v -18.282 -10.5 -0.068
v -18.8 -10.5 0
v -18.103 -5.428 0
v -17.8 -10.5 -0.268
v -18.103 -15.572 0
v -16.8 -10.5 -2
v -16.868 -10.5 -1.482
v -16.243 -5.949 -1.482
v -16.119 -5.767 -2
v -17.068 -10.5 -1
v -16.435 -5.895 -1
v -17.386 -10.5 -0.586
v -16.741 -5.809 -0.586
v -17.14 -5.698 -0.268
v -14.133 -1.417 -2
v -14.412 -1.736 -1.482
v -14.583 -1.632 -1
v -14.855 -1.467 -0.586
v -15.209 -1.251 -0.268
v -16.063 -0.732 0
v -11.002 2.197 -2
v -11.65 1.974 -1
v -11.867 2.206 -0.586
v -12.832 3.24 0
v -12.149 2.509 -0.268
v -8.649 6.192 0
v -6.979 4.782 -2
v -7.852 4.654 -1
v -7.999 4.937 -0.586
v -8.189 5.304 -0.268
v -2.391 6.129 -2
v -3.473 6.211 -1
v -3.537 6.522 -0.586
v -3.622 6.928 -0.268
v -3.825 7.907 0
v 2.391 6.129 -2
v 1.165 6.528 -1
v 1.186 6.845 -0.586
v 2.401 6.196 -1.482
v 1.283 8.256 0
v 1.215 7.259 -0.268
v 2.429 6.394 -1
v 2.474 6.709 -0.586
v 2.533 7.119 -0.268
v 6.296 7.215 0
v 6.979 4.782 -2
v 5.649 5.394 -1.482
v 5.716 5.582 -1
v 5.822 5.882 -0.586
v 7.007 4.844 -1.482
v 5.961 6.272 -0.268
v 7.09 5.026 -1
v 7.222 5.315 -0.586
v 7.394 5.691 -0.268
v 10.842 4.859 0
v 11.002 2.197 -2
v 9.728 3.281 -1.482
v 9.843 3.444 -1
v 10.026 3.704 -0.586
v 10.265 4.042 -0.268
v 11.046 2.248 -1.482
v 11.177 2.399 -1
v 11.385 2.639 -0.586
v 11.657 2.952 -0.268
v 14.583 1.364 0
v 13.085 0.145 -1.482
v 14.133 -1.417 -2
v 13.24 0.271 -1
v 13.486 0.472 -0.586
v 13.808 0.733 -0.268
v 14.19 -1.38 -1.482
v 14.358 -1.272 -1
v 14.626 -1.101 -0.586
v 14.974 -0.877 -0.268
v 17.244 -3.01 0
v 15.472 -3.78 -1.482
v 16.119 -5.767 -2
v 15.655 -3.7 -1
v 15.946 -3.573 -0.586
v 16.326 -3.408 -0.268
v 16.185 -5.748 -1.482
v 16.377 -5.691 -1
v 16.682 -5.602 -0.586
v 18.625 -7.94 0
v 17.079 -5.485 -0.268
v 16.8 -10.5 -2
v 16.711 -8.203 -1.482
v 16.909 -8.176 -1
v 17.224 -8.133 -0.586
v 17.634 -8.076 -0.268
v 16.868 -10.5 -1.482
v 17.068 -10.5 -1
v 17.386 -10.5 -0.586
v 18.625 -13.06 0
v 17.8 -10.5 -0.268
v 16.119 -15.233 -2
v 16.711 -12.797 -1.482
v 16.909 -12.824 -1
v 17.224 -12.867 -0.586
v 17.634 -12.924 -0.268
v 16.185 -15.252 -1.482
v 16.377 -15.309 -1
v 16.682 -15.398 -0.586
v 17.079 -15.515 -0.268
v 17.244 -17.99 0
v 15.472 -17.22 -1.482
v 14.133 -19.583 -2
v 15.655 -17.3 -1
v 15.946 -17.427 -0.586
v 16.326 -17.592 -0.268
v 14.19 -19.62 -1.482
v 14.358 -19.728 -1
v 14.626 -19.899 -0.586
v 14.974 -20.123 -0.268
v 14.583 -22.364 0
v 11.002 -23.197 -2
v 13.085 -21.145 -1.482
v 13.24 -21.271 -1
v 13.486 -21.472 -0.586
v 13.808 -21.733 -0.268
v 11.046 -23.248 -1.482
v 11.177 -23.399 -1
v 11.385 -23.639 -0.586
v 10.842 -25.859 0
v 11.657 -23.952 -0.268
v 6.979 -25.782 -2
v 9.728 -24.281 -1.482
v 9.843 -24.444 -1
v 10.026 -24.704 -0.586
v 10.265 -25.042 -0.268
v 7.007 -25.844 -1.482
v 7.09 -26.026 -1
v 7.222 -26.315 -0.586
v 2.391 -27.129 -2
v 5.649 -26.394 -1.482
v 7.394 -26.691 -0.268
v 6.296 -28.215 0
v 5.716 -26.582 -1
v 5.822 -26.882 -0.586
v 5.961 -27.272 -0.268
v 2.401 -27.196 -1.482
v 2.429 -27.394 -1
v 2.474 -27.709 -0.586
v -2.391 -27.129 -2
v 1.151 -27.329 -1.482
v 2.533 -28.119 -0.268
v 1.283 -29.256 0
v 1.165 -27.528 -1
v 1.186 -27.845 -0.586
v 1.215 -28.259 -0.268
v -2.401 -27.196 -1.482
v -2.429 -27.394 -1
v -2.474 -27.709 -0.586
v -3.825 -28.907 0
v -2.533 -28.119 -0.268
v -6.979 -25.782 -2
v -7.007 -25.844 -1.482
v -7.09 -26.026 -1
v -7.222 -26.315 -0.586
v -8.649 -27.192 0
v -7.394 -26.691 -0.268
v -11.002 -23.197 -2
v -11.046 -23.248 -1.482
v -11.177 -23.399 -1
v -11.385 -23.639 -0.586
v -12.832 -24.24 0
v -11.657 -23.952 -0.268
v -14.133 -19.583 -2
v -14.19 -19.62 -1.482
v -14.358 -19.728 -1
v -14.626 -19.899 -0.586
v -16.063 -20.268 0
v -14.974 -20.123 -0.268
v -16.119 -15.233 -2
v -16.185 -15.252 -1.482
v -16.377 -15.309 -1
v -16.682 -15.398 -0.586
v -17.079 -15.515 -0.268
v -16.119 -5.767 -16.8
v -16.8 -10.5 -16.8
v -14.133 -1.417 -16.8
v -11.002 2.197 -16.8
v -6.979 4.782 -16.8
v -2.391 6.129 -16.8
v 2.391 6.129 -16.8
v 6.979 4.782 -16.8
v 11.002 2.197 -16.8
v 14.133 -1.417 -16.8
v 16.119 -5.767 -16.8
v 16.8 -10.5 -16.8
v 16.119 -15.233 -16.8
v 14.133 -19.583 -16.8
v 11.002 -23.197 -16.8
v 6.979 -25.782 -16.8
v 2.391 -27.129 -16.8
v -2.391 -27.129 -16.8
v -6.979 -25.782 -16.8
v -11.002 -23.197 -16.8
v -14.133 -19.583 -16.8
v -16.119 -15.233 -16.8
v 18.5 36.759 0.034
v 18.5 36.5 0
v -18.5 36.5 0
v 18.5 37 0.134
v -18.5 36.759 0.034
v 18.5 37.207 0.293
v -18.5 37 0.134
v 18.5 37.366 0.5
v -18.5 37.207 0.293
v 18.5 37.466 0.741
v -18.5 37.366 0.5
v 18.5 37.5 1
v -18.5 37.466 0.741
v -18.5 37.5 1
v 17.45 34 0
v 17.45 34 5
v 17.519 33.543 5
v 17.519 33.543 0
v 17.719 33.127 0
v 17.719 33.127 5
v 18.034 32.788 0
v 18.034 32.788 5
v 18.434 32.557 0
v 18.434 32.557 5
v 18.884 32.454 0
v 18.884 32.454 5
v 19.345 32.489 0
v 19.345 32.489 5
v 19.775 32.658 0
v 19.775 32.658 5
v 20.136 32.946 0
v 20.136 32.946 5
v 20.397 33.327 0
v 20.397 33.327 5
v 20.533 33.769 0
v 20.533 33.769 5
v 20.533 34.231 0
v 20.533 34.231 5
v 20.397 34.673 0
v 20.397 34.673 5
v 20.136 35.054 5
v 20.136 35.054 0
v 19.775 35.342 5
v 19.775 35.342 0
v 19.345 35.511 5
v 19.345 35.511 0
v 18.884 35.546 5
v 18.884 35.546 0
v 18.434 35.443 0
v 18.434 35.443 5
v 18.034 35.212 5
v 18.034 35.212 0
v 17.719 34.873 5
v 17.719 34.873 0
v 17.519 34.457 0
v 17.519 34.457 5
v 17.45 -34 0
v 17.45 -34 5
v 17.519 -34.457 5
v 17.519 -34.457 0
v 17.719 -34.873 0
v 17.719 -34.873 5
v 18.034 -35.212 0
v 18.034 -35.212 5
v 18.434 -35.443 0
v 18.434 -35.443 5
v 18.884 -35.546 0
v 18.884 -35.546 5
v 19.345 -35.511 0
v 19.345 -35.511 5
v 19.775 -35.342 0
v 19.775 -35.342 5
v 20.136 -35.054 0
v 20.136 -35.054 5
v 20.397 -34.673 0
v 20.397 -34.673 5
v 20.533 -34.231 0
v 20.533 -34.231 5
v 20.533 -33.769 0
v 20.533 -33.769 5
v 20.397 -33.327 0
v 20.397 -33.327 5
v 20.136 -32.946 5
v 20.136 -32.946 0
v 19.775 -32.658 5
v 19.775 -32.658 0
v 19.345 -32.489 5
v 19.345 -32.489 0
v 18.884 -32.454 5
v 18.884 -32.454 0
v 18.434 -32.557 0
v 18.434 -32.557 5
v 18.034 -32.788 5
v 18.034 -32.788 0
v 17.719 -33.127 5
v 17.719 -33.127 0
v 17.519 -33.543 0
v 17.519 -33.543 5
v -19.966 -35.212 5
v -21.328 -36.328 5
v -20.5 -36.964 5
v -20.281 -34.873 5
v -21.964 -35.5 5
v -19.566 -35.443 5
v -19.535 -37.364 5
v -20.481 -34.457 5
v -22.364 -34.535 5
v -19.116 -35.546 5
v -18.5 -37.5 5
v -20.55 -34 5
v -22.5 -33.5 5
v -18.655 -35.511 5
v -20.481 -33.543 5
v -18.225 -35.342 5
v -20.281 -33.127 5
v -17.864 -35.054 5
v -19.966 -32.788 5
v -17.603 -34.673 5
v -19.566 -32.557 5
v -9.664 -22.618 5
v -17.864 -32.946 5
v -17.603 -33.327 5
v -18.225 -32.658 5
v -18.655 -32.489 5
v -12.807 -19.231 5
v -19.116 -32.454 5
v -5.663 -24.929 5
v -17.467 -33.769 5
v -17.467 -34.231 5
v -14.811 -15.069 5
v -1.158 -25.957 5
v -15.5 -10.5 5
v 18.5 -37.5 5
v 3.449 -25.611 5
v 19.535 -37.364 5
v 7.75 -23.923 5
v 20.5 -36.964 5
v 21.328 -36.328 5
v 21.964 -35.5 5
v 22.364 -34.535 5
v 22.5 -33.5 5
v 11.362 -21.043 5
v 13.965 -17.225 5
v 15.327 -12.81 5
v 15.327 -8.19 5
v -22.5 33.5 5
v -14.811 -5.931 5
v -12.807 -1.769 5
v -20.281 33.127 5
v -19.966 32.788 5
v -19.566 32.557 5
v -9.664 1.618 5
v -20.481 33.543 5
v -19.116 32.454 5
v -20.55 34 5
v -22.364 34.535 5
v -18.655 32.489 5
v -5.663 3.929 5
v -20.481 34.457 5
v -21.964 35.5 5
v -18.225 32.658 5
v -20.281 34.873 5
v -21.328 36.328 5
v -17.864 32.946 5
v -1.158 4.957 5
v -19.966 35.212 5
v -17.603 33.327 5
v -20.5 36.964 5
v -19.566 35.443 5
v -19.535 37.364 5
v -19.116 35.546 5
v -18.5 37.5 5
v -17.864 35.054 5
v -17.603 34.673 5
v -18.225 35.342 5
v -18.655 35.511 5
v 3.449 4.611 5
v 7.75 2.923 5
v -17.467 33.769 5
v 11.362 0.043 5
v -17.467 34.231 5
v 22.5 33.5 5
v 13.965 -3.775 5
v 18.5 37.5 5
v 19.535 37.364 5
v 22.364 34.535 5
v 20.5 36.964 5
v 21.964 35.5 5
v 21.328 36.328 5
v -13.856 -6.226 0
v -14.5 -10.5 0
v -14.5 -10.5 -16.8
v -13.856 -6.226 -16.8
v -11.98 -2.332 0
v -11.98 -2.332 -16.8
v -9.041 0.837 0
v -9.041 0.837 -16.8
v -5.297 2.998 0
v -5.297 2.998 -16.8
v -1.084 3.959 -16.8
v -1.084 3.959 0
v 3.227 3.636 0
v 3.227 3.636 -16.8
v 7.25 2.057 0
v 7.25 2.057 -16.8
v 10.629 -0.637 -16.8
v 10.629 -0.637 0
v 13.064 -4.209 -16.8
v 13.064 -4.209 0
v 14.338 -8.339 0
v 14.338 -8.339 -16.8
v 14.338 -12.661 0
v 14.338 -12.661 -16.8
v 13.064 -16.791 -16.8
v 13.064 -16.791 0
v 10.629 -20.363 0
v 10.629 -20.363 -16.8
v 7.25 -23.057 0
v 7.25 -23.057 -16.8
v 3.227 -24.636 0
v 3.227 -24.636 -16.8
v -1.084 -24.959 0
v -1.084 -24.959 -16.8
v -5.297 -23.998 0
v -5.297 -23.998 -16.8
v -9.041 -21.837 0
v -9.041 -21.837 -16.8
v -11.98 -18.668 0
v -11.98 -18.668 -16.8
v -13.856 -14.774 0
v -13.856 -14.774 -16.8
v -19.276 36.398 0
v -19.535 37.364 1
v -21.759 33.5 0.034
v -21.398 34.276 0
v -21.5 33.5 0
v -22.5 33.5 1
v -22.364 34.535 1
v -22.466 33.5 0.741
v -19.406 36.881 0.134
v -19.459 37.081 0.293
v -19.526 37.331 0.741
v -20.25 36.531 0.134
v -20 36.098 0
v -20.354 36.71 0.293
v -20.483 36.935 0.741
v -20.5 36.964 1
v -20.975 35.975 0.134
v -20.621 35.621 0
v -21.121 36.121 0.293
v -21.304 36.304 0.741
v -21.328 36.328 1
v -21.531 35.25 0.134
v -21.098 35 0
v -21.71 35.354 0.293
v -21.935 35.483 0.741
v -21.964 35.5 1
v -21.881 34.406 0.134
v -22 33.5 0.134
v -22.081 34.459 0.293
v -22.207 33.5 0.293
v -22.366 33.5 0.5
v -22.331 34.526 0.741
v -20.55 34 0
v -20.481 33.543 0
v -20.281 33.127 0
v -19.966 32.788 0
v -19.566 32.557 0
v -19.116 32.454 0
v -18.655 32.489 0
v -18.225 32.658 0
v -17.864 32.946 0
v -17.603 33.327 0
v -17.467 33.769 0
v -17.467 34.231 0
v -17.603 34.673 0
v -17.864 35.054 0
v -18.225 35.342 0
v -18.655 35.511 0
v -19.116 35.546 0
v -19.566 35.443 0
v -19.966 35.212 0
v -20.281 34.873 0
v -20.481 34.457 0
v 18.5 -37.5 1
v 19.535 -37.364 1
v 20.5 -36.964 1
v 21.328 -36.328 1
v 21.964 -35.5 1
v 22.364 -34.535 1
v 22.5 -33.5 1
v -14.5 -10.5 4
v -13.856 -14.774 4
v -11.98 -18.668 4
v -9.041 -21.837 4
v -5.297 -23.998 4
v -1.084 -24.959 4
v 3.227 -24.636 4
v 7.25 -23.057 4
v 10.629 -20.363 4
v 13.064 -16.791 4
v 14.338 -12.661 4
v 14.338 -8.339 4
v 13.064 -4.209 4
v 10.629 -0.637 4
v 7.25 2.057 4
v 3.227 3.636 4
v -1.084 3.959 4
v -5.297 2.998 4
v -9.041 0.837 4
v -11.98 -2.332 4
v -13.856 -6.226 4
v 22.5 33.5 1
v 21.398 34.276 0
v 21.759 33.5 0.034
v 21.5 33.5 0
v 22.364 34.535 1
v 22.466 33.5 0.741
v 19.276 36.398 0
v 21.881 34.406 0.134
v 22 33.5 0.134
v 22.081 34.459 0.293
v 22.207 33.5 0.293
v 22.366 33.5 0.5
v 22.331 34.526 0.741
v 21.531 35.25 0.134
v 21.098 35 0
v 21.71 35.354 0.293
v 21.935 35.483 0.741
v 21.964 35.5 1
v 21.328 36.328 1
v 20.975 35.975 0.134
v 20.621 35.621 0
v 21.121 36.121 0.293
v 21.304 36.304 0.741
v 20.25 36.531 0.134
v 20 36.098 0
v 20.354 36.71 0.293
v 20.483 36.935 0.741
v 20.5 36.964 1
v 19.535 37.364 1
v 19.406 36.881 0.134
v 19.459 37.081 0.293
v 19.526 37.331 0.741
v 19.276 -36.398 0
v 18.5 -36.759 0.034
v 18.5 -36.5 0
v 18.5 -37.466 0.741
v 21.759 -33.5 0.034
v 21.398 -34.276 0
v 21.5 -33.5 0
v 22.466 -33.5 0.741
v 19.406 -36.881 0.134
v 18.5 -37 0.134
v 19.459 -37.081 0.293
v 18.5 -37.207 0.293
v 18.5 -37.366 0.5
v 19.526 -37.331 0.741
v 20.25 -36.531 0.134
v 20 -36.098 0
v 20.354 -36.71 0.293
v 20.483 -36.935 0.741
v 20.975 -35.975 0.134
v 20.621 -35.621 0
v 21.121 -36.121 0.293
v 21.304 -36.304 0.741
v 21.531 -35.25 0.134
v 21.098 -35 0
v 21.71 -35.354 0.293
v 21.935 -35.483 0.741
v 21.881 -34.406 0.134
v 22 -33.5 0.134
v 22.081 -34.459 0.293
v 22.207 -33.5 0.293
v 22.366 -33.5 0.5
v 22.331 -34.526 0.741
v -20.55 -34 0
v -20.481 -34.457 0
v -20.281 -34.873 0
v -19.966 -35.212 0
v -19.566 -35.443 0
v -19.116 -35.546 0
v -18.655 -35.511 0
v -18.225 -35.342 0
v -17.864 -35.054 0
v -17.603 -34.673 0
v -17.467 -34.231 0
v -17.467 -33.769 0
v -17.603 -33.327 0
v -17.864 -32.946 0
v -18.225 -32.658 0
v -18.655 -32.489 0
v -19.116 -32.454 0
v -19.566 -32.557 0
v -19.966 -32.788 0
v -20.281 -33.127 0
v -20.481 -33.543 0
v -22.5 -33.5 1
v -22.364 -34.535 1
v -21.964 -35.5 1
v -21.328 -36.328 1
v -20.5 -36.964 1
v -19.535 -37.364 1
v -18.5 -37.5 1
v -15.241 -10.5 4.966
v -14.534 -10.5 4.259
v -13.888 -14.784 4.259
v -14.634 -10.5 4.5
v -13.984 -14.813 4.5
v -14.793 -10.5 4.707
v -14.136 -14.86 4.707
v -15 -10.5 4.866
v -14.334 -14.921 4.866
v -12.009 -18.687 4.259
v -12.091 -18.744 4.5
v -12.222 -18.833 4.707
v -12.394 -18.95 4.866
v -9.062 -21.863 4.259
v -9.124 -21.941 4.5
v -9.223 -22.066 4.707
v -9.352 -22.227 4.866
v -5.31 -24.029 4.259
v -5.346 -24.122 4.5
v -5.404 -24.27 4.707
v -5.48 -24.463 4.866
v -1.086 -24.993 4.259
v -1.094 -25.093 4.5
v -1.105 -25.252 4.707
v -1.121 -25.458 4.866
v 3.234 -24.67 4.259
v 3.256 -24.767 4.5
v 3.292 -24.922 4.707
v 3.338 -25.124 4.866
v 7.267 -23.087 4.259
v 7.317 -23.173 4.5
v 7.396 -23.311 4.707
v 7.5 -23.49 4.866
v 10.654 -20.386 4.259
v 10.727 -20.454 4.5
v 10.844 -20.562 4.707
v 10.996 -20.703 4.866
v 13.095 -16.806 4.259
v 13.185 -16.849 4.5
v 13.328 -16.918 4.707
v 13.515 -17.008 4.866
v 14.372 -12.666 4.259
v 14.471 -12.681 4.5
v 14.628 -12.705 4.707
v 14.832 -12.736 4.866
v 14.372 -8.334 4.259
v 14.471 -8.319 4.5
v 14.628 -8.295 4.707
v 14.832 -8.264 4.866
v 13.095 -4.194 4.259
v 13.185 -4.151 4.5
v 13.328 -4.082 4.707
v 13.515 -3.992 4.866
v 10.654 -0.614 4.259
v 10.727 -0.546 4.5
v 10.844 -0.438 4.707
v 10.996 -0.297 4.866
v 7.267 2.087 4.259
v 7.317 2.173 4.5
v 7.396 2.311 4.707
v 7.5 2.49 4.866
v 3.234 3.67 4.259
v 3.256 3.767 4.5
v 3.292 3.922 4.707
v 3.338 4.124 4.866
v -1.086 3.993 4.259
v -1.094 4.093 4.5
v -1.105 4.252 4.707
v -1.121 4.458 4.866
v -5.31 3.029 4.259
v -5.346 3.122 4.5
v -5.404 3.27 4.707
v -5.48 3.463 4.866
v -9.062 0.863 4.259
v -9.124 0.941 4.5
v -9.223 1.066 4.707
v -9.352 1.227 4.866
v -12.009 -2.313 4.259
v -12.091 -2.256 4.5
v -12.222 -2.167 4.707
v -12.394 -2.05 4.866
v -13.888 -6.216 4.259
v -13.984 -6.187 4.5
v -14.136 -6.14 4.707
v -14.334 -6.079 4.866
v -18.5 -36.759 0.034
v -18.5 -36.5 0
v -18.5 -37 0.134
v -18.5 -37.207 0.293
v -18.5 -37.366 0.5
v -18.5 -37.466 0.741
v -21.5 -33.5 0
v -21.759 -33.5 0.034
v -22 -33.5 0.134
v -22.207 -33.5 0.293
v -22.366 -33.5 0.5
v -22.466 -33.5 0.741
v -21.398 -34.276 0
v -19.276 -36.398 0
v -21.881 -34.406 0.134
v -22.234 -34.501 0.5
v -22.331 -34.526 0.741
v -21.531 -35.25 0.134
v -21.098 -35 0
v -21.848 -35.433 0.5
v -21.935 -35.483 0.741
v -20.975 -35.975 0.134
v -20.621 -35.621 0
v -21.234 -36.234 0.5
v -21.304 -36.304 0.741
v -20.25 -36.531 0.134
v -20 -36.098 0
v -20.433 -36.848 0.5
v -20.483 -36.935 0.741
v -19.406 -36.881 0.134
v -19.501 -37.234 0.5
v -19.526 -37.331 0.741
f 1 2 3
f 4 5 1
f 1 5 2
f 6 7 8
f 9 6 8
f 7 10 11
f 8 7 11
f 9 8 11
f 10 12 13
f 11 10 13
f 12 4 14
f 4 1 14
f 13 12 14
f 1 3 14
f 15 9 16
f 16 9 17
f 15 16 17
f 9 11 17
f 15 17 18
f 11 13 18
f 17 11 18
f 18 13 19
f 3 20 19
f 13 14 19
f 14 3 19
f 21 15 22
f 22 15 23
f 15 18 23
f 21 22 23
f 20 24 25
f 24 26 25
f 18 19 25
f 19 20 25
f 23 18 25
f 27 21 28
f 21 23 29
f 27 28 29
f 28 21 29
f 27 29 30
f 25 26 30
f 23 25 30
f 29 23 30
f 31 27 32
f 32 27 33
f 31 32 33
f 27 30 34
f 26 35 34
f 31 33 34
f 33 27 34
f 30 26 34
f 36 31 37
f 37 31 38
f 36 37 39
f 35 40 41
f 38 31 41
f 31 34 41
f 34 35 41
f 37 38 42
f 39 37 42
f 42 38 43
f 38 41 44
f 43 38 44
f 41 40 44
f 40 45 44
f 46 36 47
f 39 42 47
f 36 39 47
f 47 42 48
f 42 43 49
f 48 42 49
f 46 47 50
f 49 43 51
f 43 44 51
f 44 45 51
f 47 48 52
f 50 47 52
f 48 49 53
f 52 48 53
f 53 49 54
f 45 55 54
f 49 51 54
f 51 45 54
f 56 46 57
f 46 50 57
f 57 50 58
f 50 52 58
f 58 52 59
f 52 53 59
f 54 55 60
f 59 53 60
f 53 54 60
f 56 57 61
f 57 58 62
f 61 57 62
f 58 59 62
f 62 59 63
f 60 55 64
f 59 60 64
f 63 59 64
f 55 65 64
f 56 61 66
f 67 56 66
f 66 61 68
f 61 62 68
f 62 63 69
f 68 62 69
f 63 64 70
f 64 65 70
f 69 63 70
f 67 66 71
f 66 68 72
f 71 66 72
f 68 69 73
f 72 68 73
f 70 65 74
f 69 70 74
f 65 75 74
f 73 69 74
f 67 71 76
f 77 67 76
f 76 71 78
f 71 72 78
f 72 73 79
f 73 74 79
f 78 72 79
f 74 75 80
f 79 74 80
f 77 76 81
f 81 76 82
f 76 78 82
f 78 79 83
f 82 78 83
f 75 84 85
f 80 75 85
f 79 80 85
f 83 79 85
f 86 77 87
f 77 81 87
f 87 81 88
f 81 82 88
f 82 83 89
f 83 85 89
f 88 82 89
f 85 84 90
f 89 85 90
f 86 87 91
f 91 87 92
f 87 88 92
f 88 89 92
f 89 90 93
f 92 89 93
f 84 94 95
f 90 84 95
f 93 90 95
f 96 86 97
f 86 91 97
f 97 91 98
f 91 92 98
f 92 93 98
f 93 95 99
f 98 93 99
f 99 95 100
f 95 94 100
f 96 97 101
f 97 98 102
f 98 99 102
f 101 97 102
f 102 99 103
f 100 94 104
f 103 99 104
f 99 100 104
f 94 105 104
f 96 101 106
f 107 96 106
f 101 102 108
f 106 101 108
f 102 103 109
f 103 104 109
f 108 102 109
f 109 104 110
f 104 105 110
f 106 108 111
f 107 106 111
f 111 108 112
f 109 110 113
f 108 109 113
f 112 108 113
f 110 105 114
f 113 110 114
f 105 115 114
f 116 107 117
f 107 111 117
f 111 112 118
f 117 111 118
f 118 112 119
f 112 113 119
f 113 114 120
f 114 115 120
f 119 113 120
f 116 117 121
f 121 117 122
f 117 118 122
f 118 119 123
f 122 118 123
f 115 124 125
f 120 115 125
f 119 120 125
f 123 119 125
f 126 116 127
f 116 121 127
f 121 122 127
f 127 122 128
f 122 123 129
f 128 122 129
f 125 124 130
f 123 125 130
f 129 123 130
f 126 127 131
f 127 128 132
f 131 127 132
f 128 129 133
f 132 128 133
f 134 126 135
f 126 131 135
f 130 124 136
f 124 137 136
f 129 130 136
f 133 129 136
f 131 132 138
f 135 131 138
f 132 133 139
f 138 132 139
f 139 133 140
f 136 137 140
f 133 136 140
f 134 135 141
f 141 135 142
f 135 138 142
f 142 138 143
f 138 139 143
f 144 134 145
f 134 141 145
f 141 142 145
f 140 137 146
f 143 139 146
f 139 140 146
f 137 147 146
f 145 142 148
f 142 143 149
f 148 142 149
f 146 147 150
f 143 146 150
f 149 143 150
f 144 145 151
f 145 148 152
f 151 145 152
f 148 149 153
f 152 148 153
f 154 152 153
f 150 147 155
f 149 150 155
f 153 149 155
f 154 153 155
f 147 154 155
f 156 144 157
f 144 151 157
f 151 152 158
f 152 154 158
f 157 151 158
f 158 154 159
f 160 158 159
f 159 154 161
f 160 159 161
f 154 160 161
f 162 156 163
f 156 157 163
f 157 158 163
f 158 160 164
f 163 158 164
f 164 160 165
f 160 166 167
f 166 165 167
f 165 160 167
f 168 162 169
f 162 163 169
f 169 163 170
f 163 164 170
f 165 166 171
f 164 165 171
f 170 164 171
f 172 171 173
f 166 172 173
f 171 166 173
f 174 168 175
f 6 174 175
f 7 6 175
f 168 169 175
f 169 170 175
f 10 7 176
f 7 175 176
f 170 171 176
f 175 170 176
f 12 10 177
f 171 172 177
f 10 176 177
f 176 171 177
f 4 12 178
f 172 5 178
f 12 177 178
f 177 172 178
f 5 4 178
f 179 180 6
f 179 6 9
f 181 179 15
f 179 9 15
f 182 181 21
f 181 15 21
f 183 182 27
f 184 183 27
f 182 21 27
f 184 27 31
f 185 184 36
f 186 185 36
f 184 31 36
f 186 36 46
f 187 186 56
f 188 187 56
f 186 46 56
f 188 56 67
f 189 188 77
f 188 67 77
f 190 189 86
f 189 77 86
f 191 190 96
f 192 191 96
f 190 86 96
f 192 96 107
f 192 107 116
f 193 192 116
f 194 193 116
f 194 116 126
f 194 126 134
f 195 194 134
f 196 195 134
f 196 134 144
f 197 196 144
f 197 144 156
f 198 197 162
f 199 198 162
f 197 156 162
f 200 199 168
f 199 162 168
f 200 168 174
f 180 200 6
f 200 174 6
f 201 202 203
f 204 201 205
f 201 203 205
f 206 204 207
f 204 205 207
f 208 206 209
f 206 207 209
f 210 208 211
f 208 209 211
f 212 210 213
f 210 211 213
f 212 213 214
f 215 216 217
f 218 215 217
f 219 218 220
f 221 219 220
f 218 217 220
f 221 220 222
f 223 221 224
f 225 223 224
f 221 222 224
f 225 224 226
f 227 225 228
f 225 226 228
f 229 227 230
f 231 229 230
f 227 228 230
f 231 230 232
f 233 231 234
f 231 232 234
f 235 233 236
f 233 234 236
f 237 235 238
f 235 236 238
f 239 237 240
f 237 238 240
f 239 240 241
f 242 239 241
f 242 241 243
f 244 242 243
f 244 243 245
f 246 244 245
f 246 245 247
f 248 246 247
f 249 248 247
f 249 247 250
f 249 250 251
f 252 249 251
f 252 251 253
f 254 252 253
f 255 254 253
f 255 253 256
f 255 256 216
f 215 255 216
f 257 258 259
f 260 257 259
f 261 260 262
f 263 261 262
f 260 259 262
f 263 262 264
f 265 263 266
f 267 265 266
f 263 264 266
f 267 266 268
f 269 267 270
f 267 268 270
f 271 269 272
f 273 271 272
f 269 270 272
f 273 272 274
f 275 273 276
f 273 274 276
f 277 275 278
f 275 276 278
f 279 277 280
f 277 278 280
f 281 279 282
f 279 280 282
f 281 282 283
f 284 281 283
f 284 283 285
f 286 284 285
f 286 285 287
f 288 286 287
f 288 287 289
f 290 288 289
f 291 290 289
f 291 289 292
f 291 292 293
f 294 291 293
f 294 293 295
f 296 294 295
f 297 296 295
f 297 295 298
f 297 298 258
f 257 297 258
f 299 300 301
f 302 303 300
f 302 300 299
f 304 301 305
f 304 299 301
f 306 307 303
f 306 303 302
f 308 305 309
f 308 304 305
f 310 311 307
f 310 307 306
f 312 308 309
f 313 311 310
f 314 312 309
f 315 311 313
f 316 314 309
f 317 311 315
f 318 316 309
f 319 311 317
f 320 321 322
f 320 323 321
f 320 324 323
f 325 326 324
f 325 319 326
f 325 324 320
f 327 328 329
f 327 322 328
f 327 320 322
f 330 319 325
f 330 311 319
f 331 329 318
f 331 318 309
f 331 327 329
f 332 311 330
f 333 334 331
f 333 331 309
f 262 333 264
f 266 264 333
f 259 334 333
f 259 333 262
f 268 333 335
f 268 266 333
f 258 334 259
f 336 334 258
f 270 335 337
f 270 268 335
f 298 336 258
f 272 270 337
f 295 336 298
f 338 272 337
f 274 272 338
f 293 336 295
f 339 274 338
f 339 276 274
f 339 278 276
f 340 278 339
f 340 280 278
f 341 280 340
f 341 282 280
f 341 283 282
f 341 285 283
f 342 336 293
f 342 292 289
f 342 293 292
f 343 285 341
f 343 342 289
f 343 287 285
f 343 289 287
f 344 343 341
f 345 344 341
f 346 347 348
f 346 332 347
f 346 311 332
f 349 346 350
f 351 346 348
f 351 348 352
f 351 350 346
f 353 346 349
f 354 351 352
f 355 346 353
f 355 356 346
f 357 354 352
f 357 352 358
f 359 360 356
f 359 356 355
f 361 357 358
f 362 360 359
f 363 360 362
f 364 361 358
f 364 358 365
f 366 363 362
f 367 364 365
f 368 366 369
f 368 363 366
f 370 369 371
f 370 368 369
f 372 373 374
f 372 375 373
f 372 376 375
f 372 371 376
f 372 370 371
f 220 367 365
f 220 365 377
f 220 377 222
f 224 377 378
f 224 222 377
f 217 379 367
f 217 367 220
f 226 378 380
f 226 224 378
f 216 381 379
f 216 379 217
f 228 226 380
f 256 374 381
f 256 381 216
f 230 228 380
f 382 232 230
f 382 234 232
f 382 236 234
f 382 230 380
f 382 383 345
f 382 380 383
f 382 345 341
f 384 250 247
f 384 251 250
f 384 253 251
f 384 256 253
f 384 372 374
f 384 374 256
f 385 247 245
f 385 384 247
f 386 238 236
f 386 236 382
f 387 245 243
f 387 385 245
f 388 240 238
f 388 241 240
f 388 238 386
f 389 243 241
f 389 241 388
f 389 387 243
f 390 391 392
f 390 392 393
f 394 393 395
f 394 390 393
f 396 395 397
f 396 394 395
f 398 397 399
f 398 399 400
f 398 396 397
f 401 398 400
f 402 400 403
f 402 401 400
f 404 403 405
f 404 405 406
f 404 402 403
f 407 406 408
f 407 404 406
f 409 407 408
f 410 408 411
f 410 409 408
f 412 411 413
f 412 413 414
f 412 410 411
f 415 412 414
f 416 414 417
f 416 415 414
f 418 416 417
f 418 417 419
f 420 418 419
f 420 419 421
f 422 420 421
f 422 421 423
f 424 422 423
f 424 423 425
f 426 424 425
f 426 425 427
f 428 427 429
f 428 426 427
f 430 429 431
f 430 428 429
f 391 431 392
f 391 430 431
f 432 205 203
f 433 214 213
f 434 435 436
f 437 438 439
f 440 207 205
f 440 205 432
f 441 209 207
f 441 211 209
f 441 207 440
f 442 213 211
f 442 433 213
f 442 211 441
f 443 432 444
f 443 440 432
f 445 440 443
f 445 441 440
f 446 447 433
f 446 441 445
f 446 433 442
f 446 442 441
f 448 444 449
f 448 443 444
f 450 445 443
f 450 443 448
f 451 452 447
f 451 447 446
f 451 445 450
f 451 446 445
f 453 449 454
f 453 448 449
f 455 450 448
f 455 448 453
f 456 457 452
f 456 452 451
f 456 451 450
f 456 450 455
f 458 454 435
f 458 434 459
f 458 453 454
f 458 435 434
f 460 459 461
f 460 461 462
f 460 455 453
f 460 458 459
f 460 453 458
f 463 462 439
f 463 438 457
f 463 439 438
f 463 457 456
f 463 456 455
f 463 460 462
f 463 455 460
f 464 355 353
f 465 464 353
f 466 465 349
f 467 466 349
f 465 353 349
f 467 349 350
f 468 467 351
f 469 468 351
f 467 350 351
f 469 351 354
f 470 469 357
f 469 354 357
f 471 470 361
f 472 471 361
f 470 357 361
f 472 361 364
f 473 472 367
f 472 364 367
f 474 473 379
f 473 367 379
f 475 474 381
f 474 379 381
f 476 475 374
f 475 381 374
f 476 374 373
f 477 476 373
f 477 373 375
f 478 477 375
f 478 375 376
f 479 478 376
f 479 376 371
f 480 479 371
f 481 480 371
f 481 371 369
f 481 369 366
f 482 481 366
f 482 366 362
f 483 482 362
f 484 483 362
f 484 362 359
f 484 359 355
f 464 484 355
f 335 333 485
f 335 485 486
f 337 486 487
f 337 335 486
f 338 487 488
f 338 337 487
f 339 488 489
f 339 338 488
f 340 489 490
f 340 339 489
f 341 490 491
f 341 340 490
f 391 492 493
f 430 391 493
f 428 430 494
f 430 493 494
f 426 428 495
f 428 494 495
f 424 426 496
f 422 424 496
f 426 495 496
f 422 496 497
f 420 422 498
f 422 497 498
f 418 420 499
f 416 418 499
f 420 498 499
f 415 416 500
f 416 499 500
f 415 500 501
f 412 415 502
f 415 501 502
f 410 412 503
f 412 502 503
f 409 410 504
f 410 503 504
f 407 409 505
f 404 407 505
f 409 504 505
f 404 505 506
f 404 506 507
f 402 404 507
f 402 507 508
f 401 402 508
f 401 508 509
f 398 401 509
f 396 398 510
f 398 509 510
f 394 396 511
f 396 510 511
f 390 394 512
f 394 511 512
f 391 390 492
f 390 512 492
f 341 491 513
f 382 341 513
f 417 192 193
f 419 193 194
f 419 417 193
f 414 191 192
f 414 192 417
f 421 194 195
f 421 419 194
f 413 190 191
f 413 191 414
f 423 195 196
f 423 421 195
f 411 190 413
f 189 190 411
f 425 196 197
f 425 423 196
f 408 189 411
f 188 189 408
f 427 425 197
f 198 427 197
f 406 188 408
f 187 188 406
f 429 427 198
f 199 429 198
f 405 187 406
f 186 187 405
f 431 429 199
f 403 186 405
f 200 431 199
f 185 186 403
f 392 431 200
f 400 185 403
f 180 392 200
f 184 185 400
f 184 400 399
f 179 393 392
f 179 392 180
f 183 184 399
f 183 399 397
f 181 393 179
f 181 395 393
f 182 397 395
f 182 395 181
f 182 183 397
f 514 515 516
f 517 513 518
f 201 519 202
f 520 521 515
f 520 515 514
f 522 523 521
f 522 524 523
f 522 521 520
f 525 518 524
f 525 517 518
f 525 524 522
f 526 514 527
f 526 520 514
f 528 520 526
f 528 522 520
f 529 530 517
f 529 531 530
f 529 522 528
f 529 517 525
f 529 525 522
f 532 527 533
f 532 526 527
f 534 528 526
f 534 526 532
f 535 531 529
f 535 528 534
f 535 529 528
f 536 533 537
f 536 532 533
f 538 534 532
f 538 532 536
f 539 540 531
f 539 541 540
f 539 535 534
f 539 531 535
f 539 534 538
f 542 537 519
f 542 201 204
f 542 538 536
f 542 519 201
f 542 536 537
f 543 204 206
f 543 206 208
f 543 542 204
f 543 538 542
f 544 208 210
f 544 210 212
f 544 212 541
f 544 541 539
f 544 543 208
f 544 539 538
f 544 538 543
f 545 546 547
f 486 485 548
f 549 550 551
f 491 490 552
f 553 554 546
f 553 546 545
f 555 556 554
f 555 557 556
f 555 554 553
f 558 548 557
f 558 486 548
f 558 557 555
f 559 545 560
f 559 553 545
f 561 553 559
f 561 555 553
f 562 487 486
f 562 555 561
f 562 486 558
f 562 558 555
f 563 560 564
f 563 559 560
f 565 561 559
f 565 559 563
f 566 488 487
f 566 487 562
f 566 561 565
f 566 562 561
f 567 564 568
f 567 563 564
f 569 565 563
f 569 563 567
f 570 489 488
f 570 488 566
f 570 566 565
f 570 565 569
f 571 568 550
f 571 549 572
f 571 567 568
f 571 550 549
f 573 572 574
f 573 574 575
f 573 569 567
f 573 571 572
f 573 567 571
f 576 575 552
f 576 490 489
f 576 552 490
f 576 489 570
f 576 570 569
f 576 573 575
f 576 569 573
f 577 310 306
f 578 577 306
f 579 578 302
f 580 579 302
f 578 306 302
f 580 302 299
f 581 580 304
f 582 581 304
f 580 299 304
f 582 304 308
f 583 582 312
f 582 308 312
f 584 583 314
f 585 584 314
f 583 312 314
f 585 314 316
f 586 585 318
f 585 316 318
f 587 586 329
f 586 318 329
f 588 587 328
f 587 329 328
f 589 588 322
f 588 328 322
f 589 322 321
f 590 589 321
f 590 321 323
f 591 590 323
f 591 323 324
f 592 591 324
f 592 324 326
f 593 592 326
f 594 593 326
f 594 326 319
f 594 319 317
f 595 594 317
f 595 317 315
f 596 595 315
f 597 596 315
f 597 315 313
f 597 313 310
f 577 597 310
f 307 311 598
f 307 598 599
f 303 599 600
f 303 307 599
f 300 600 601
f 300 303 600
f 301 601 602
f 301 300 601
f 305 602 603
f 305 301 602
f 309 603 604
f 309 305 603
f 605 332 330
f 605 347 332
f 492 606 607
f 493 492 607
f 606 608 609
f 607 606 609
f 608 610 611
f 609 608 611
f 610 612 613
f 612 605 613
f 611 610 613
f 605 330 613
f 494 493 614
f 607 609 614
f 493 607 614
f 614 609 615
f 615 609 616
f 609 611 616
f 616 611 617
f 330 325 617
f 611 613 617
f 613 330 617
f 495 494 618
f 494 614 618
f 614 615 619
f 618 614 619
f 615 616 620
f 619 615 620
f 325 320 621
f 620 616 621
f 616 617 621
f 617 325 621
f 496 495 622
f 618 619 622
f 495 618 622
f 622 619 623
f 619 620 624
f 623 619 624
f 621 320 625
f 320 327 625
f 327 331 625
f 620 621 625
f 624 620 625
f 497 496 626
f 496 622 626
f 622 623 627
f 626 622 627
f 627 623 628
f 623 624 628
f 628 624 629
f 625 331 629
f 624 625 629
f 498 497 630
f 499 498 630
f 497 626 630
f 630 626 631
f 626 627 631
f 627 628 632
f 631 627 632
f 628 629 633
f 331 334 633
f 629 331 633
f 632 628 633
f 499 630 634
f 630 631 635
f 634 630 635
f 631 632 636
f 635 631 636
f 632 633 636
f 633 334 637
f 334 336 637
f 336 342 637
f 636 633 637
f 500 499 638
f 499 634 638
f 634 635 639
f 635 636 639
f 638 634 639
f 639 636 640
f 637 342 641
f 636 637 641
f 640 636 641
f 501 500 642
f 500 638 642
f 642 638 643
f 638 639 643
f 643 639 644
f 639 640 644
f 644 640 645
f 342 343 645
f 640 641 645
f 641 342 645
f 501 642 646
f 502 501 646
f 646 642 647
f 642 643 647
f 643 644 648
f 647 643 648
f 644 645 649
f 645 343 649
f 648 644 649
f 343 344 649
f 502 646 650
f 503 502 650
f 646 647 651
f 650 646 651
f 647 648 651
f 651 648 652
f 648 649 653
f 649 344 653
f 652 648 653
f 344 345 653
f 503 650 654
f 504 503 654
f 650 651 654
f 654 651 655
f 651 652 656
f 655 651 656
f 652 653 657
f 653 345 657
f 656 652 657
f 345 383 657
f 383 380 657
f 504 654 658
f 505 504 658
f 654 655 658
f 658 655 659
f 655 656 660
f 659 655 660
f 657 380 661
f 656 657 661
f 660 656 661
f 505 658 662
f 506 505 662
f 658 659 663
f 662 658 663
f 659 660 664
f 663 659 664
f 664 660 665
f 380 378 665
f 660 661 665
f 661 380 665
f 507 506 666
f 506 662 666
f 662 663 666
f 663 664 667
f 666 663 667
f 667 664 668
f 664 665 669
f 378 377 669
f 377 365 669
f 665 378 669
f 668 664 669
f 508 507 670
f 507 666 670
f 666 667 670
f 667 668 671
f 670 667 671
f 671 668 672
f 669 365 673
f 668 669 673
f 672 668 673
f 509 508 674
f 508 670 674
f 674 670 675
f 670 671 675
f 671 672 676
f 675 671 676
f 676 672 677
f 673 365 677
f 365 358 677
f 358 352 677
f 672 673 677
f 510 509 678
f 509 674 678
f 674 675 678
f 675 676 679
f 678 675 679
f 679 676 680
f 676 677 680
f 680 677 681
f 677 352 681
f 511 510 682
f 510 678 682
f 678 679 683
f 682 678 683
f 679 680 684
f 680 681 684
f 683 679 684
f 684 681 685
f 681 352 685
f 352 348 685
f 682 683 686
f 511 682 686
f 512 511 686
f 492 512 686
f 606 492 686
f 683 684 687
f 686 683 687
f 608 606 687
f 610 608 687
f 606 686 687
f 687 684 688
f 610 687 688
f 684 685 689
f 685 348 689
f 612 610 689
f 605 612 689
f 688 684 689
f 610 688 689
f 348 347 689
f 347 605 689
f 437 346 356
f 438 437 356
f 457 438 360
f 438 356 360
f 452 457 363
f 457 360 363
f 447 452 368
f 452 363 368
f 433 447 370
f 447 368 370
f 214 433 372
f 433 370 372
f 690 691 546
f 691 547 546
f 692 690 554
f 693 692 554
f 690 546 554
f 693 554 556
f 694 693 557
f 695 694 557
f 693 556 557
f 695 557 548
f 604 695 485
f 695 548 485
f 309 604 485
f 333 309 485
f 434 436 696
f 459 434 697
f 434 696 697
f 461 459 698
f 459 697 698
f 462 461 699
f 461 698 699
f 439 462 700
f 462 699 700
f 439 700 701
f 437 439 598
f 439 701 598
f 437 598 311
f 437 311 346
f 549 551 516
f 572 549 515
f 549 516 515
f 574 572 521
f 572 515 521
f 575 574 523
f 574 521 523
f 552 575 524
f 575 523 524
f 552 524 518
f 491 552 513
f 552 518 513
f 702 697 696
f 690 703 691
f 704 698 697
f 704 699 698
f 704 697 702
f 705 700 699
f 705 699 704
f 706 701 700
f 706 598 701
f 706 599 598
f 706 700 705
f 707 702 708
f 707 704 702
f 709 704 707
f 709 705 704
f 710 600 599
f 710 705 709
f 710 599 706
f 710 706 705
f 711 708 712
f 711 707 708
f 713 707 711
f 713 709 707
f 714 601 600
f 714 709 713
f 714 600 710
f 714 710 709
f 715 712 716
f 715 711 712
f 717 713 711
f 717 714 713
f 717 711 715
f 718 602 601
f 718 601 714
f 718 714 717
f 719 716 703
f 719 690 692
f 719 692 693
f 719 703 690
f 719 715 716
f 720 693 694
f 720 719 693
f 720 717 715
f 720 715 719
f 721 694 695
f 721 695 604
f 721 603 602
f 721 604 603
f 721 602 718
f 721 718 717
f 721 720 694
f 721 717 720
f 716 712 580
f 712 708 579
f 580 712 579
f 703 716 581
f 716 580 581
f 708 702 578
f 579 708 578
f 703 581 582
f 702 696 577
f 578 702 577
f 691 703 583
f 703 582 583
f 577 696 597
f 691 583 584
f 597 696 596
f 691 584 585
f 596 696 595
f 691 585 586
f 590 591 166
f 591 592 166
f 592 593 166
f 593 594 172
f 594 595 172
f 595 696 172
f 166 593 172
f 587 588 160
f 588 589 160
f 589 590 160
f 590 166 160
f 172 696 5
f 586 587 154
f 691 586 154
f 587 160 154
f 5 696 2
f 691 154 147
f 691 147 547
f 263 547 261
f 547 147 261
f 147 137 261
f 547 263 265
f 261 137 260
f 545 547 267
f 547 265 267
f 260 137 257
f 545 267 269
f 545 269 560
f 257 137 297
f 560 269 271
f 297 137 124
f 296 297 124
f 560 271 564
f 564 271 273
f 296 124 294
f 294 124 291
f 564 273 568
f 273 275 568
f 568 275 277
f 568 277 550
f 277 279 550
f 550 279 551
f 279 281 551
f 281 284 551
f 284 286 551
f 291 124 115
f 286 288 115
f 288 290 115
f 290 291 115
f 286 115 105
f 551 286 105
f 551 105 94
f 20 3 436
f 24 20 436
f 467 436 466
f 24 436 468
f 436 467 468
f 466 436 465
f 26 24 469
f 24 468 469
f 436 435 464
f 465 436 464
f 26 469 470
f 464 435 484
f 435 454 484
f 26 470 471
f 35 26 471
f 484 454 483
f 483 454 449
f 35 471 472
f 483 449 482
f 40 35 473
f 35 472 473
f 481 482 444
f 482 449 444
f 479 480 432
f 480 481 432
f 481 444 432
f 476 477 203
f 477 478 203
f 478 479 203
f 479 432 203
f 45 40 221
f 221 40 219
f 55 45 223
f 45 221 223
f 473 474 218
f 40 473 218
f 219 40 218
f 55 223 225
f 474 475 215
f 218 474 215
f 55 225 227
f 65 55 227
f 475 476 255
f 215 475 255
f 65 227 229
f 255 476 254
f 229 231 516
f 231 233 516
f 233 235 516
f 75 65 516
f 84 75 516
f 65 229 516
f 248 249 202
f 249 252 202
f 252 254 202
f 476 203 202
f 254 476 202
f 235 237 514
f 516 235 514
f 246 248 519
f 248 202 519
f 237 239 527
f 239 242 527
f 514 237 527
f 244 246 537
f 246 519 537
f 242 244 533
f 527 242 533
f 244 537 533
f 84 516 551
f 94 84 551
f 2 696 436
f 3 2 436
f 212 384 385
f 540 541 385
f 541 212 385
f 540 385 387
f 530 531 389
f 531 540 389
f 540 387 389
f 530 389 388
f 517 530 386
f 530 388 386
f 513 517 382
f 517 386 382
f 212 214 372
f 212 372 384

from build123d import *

# Parameters (mm, degrees)
SKETCH1_W           = 45
SKETCH1_H           = 75
BOSS_EXTRUDE1_DEPTH = 5
SKETCH2_R           = 1.55
SKETCH2_R_2         = 14.5
SKETCH2_R_3         = 10
CUT_EXTRUDE4_DEPTH  = 27.5
FILLET3_R           = 4
SKETCH3_R           = 16.8
SKETCH3_R_2         = 14.5
BOSS_EXTRUDE2_DEPTH = 16.8
FILLET4_R           = 2
FILLET5_R           = 1


with BuildPart() as part:
    # Sketch1 → Boss-Extrude1 (new body)
    with BuildSketch(Plane.XY):
        Rectangle(SKETCH1_W, SKETCH1_H)
    extrude(amount=BOSS_EXTRUDE1_DEPTH)

    # Sketch2 → Cut-Extrude4 (cut, symmetric)
    # profile 1 of 6: a face of its own
    with BuildSketch(Plane.XY.offset(5)):
        with Locations(Location((19, 34, 0), (0, 0, 180))):
            Circle(SKETCH2_R)
    # profile 2 of 6: a face of its own
    with BuildSketch(Plane.XY.offset(5)):
        with Locations(Location((-19, 34, 0), (0, 0, 180))):
            Circle(SKETCH2_R)
    # profile 3 of 6: a face of its own
    with BuildSketch(Plane.XY.offset(5)):
        with Locations(Location((19, -34, 0), (0, 0, 180))):
            Circle(SKETCH2_R)
    # profile 4 of 6: a face of its own
    with BuildSketch(Plane.XY.offset(5)):
        with Locations(Location((-19, -34, 0), (0, 0, 180))):
            Circle(SKETCH2_R)
    # profile 5 of 6: a face of its own
    with BuildSketch(Plane.XY.offset(5)):
        with Locations(Location((0, -10.5, 0), (0, 0, 180))):
            Circle(SKETCH2_R_2)
        with Locations((0, -10.5)):
            Circle(SKETCH2_R_3, mode=Mode.SUBTRACT)
    # profile 6 of 6: a face of its own
    with BuildSketch(Plane.XY.offset(5)):
        with Locations((0, -10.5)):
            Circle(SKETCH2_R_3)
    extrude(amount=CUT_EXTRUDE4_DEPTH, both=True, mode=Mode.SUBTRACT)

    # Fillet3
    fillet3_edges = [part.edges().sort_by_distance(p)[0] for p in [
        (-22.5, -37.5, 2.5),
        (-22.5, 37.5, 2.5),
        (22.5, 37.5, 2.5),
        (22.5, -37.5, 2.5),
    ]]
    fillet(fillet3_edges, radius=FILLET3_R)

    # Sketch3 → Boss-Extrude2 (add)
    with BuildSketch(Plane(origin=(0, 0, 0), x_dir=(-1, 0, 0), z_dir=(0, 0, -1))):
        with Locations((0, -10.5)):
            Circle(SKETCH3_R)
        with Locations((0, -10.5)):
            Circle(SKETCH3_R_2, mode=Mode.SUBTRACT)
    extrude(amount=BOSS_EXTRUDE2_DEPTH)

    # Fillet4
    fillet4_edges = [part.edges().sort_by_distance(p)[0] for p in [
        (16.8, -10.5, 0),
    ]]
    fillet(fillet4_edges, radius=FILLET4_R)

    # Fillet5
    fillet5_edges = [part.edges().sort_by_distance(p)[0] for p in [
        (14.5, -10.5, 5),
        (0, -37.5, 0),
        (-22.5, 0, 0),
        (0, 37.5, 0),
        (22.5, 0, 0),
        (-21.328427125, 36.328427125, 0),
        (21.328427125, 36.328427125, 0),
        (21.328427125, -36.328427125, 0),
        (-21.328427125, -36.328427125, 0),
    ]]
    fillet(fillet5_edges, radius=FILLET5_R)


solid = part.part
